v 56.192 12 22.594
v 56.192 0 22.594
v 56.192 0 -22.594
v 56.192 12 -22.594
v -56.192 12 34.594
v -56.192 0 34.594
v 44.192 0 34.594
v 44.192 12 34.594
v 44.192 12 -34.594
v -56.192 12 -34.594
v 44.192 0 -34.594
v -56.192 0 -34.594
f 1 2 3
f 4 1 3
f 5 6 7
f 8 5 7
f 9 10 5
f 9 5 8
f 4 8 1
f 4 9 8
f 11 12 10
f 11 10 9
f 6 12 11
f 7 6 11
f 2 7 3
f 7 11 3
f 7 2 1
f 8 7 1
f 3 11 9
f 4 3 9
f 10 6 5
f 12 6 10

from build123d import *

# Parameters (mm, degrees)
SKETCH1_W           = 112.384257698
SKETCH1_H           = 69.188872884
BOSS_EXTRUDE1_DEPTH = 12
CHAMFER3_SIZE       = 12
CHAMFER4_SIZE       = 12


with BuildPart() as part:
    # Sketch1 → Boss-Extrude1 (new body)
    with BuildSketch(Plane(origin=(0, 0, 0), x_dir=(1, 0, 0), z_dir=(0, 1, 0))):
        Rectangle(SKETCH1_W, SKETCH1_H)
    extrude(amount=BOSS_EXTRUDE1_DEPTH)

    # Chamfer3
    chamfer3_edges = [part.edges().sort_by_distance(p)[0] for p in [
        (56.192128849, 6, 34.594436442),
    ]]
    chamfer(chamfer3_edges, length=CHAMFER3_SIZE)

    # Chamfer4
    chamfer4_edges = [part.edges().sort_by_distance(p)[0] for p in [
        (56.192128849, 6, -34.594436442),
    ]]
    chamfer(chamfer4_edges, length=CHAMFER4_SIZE)


solid = part.part
